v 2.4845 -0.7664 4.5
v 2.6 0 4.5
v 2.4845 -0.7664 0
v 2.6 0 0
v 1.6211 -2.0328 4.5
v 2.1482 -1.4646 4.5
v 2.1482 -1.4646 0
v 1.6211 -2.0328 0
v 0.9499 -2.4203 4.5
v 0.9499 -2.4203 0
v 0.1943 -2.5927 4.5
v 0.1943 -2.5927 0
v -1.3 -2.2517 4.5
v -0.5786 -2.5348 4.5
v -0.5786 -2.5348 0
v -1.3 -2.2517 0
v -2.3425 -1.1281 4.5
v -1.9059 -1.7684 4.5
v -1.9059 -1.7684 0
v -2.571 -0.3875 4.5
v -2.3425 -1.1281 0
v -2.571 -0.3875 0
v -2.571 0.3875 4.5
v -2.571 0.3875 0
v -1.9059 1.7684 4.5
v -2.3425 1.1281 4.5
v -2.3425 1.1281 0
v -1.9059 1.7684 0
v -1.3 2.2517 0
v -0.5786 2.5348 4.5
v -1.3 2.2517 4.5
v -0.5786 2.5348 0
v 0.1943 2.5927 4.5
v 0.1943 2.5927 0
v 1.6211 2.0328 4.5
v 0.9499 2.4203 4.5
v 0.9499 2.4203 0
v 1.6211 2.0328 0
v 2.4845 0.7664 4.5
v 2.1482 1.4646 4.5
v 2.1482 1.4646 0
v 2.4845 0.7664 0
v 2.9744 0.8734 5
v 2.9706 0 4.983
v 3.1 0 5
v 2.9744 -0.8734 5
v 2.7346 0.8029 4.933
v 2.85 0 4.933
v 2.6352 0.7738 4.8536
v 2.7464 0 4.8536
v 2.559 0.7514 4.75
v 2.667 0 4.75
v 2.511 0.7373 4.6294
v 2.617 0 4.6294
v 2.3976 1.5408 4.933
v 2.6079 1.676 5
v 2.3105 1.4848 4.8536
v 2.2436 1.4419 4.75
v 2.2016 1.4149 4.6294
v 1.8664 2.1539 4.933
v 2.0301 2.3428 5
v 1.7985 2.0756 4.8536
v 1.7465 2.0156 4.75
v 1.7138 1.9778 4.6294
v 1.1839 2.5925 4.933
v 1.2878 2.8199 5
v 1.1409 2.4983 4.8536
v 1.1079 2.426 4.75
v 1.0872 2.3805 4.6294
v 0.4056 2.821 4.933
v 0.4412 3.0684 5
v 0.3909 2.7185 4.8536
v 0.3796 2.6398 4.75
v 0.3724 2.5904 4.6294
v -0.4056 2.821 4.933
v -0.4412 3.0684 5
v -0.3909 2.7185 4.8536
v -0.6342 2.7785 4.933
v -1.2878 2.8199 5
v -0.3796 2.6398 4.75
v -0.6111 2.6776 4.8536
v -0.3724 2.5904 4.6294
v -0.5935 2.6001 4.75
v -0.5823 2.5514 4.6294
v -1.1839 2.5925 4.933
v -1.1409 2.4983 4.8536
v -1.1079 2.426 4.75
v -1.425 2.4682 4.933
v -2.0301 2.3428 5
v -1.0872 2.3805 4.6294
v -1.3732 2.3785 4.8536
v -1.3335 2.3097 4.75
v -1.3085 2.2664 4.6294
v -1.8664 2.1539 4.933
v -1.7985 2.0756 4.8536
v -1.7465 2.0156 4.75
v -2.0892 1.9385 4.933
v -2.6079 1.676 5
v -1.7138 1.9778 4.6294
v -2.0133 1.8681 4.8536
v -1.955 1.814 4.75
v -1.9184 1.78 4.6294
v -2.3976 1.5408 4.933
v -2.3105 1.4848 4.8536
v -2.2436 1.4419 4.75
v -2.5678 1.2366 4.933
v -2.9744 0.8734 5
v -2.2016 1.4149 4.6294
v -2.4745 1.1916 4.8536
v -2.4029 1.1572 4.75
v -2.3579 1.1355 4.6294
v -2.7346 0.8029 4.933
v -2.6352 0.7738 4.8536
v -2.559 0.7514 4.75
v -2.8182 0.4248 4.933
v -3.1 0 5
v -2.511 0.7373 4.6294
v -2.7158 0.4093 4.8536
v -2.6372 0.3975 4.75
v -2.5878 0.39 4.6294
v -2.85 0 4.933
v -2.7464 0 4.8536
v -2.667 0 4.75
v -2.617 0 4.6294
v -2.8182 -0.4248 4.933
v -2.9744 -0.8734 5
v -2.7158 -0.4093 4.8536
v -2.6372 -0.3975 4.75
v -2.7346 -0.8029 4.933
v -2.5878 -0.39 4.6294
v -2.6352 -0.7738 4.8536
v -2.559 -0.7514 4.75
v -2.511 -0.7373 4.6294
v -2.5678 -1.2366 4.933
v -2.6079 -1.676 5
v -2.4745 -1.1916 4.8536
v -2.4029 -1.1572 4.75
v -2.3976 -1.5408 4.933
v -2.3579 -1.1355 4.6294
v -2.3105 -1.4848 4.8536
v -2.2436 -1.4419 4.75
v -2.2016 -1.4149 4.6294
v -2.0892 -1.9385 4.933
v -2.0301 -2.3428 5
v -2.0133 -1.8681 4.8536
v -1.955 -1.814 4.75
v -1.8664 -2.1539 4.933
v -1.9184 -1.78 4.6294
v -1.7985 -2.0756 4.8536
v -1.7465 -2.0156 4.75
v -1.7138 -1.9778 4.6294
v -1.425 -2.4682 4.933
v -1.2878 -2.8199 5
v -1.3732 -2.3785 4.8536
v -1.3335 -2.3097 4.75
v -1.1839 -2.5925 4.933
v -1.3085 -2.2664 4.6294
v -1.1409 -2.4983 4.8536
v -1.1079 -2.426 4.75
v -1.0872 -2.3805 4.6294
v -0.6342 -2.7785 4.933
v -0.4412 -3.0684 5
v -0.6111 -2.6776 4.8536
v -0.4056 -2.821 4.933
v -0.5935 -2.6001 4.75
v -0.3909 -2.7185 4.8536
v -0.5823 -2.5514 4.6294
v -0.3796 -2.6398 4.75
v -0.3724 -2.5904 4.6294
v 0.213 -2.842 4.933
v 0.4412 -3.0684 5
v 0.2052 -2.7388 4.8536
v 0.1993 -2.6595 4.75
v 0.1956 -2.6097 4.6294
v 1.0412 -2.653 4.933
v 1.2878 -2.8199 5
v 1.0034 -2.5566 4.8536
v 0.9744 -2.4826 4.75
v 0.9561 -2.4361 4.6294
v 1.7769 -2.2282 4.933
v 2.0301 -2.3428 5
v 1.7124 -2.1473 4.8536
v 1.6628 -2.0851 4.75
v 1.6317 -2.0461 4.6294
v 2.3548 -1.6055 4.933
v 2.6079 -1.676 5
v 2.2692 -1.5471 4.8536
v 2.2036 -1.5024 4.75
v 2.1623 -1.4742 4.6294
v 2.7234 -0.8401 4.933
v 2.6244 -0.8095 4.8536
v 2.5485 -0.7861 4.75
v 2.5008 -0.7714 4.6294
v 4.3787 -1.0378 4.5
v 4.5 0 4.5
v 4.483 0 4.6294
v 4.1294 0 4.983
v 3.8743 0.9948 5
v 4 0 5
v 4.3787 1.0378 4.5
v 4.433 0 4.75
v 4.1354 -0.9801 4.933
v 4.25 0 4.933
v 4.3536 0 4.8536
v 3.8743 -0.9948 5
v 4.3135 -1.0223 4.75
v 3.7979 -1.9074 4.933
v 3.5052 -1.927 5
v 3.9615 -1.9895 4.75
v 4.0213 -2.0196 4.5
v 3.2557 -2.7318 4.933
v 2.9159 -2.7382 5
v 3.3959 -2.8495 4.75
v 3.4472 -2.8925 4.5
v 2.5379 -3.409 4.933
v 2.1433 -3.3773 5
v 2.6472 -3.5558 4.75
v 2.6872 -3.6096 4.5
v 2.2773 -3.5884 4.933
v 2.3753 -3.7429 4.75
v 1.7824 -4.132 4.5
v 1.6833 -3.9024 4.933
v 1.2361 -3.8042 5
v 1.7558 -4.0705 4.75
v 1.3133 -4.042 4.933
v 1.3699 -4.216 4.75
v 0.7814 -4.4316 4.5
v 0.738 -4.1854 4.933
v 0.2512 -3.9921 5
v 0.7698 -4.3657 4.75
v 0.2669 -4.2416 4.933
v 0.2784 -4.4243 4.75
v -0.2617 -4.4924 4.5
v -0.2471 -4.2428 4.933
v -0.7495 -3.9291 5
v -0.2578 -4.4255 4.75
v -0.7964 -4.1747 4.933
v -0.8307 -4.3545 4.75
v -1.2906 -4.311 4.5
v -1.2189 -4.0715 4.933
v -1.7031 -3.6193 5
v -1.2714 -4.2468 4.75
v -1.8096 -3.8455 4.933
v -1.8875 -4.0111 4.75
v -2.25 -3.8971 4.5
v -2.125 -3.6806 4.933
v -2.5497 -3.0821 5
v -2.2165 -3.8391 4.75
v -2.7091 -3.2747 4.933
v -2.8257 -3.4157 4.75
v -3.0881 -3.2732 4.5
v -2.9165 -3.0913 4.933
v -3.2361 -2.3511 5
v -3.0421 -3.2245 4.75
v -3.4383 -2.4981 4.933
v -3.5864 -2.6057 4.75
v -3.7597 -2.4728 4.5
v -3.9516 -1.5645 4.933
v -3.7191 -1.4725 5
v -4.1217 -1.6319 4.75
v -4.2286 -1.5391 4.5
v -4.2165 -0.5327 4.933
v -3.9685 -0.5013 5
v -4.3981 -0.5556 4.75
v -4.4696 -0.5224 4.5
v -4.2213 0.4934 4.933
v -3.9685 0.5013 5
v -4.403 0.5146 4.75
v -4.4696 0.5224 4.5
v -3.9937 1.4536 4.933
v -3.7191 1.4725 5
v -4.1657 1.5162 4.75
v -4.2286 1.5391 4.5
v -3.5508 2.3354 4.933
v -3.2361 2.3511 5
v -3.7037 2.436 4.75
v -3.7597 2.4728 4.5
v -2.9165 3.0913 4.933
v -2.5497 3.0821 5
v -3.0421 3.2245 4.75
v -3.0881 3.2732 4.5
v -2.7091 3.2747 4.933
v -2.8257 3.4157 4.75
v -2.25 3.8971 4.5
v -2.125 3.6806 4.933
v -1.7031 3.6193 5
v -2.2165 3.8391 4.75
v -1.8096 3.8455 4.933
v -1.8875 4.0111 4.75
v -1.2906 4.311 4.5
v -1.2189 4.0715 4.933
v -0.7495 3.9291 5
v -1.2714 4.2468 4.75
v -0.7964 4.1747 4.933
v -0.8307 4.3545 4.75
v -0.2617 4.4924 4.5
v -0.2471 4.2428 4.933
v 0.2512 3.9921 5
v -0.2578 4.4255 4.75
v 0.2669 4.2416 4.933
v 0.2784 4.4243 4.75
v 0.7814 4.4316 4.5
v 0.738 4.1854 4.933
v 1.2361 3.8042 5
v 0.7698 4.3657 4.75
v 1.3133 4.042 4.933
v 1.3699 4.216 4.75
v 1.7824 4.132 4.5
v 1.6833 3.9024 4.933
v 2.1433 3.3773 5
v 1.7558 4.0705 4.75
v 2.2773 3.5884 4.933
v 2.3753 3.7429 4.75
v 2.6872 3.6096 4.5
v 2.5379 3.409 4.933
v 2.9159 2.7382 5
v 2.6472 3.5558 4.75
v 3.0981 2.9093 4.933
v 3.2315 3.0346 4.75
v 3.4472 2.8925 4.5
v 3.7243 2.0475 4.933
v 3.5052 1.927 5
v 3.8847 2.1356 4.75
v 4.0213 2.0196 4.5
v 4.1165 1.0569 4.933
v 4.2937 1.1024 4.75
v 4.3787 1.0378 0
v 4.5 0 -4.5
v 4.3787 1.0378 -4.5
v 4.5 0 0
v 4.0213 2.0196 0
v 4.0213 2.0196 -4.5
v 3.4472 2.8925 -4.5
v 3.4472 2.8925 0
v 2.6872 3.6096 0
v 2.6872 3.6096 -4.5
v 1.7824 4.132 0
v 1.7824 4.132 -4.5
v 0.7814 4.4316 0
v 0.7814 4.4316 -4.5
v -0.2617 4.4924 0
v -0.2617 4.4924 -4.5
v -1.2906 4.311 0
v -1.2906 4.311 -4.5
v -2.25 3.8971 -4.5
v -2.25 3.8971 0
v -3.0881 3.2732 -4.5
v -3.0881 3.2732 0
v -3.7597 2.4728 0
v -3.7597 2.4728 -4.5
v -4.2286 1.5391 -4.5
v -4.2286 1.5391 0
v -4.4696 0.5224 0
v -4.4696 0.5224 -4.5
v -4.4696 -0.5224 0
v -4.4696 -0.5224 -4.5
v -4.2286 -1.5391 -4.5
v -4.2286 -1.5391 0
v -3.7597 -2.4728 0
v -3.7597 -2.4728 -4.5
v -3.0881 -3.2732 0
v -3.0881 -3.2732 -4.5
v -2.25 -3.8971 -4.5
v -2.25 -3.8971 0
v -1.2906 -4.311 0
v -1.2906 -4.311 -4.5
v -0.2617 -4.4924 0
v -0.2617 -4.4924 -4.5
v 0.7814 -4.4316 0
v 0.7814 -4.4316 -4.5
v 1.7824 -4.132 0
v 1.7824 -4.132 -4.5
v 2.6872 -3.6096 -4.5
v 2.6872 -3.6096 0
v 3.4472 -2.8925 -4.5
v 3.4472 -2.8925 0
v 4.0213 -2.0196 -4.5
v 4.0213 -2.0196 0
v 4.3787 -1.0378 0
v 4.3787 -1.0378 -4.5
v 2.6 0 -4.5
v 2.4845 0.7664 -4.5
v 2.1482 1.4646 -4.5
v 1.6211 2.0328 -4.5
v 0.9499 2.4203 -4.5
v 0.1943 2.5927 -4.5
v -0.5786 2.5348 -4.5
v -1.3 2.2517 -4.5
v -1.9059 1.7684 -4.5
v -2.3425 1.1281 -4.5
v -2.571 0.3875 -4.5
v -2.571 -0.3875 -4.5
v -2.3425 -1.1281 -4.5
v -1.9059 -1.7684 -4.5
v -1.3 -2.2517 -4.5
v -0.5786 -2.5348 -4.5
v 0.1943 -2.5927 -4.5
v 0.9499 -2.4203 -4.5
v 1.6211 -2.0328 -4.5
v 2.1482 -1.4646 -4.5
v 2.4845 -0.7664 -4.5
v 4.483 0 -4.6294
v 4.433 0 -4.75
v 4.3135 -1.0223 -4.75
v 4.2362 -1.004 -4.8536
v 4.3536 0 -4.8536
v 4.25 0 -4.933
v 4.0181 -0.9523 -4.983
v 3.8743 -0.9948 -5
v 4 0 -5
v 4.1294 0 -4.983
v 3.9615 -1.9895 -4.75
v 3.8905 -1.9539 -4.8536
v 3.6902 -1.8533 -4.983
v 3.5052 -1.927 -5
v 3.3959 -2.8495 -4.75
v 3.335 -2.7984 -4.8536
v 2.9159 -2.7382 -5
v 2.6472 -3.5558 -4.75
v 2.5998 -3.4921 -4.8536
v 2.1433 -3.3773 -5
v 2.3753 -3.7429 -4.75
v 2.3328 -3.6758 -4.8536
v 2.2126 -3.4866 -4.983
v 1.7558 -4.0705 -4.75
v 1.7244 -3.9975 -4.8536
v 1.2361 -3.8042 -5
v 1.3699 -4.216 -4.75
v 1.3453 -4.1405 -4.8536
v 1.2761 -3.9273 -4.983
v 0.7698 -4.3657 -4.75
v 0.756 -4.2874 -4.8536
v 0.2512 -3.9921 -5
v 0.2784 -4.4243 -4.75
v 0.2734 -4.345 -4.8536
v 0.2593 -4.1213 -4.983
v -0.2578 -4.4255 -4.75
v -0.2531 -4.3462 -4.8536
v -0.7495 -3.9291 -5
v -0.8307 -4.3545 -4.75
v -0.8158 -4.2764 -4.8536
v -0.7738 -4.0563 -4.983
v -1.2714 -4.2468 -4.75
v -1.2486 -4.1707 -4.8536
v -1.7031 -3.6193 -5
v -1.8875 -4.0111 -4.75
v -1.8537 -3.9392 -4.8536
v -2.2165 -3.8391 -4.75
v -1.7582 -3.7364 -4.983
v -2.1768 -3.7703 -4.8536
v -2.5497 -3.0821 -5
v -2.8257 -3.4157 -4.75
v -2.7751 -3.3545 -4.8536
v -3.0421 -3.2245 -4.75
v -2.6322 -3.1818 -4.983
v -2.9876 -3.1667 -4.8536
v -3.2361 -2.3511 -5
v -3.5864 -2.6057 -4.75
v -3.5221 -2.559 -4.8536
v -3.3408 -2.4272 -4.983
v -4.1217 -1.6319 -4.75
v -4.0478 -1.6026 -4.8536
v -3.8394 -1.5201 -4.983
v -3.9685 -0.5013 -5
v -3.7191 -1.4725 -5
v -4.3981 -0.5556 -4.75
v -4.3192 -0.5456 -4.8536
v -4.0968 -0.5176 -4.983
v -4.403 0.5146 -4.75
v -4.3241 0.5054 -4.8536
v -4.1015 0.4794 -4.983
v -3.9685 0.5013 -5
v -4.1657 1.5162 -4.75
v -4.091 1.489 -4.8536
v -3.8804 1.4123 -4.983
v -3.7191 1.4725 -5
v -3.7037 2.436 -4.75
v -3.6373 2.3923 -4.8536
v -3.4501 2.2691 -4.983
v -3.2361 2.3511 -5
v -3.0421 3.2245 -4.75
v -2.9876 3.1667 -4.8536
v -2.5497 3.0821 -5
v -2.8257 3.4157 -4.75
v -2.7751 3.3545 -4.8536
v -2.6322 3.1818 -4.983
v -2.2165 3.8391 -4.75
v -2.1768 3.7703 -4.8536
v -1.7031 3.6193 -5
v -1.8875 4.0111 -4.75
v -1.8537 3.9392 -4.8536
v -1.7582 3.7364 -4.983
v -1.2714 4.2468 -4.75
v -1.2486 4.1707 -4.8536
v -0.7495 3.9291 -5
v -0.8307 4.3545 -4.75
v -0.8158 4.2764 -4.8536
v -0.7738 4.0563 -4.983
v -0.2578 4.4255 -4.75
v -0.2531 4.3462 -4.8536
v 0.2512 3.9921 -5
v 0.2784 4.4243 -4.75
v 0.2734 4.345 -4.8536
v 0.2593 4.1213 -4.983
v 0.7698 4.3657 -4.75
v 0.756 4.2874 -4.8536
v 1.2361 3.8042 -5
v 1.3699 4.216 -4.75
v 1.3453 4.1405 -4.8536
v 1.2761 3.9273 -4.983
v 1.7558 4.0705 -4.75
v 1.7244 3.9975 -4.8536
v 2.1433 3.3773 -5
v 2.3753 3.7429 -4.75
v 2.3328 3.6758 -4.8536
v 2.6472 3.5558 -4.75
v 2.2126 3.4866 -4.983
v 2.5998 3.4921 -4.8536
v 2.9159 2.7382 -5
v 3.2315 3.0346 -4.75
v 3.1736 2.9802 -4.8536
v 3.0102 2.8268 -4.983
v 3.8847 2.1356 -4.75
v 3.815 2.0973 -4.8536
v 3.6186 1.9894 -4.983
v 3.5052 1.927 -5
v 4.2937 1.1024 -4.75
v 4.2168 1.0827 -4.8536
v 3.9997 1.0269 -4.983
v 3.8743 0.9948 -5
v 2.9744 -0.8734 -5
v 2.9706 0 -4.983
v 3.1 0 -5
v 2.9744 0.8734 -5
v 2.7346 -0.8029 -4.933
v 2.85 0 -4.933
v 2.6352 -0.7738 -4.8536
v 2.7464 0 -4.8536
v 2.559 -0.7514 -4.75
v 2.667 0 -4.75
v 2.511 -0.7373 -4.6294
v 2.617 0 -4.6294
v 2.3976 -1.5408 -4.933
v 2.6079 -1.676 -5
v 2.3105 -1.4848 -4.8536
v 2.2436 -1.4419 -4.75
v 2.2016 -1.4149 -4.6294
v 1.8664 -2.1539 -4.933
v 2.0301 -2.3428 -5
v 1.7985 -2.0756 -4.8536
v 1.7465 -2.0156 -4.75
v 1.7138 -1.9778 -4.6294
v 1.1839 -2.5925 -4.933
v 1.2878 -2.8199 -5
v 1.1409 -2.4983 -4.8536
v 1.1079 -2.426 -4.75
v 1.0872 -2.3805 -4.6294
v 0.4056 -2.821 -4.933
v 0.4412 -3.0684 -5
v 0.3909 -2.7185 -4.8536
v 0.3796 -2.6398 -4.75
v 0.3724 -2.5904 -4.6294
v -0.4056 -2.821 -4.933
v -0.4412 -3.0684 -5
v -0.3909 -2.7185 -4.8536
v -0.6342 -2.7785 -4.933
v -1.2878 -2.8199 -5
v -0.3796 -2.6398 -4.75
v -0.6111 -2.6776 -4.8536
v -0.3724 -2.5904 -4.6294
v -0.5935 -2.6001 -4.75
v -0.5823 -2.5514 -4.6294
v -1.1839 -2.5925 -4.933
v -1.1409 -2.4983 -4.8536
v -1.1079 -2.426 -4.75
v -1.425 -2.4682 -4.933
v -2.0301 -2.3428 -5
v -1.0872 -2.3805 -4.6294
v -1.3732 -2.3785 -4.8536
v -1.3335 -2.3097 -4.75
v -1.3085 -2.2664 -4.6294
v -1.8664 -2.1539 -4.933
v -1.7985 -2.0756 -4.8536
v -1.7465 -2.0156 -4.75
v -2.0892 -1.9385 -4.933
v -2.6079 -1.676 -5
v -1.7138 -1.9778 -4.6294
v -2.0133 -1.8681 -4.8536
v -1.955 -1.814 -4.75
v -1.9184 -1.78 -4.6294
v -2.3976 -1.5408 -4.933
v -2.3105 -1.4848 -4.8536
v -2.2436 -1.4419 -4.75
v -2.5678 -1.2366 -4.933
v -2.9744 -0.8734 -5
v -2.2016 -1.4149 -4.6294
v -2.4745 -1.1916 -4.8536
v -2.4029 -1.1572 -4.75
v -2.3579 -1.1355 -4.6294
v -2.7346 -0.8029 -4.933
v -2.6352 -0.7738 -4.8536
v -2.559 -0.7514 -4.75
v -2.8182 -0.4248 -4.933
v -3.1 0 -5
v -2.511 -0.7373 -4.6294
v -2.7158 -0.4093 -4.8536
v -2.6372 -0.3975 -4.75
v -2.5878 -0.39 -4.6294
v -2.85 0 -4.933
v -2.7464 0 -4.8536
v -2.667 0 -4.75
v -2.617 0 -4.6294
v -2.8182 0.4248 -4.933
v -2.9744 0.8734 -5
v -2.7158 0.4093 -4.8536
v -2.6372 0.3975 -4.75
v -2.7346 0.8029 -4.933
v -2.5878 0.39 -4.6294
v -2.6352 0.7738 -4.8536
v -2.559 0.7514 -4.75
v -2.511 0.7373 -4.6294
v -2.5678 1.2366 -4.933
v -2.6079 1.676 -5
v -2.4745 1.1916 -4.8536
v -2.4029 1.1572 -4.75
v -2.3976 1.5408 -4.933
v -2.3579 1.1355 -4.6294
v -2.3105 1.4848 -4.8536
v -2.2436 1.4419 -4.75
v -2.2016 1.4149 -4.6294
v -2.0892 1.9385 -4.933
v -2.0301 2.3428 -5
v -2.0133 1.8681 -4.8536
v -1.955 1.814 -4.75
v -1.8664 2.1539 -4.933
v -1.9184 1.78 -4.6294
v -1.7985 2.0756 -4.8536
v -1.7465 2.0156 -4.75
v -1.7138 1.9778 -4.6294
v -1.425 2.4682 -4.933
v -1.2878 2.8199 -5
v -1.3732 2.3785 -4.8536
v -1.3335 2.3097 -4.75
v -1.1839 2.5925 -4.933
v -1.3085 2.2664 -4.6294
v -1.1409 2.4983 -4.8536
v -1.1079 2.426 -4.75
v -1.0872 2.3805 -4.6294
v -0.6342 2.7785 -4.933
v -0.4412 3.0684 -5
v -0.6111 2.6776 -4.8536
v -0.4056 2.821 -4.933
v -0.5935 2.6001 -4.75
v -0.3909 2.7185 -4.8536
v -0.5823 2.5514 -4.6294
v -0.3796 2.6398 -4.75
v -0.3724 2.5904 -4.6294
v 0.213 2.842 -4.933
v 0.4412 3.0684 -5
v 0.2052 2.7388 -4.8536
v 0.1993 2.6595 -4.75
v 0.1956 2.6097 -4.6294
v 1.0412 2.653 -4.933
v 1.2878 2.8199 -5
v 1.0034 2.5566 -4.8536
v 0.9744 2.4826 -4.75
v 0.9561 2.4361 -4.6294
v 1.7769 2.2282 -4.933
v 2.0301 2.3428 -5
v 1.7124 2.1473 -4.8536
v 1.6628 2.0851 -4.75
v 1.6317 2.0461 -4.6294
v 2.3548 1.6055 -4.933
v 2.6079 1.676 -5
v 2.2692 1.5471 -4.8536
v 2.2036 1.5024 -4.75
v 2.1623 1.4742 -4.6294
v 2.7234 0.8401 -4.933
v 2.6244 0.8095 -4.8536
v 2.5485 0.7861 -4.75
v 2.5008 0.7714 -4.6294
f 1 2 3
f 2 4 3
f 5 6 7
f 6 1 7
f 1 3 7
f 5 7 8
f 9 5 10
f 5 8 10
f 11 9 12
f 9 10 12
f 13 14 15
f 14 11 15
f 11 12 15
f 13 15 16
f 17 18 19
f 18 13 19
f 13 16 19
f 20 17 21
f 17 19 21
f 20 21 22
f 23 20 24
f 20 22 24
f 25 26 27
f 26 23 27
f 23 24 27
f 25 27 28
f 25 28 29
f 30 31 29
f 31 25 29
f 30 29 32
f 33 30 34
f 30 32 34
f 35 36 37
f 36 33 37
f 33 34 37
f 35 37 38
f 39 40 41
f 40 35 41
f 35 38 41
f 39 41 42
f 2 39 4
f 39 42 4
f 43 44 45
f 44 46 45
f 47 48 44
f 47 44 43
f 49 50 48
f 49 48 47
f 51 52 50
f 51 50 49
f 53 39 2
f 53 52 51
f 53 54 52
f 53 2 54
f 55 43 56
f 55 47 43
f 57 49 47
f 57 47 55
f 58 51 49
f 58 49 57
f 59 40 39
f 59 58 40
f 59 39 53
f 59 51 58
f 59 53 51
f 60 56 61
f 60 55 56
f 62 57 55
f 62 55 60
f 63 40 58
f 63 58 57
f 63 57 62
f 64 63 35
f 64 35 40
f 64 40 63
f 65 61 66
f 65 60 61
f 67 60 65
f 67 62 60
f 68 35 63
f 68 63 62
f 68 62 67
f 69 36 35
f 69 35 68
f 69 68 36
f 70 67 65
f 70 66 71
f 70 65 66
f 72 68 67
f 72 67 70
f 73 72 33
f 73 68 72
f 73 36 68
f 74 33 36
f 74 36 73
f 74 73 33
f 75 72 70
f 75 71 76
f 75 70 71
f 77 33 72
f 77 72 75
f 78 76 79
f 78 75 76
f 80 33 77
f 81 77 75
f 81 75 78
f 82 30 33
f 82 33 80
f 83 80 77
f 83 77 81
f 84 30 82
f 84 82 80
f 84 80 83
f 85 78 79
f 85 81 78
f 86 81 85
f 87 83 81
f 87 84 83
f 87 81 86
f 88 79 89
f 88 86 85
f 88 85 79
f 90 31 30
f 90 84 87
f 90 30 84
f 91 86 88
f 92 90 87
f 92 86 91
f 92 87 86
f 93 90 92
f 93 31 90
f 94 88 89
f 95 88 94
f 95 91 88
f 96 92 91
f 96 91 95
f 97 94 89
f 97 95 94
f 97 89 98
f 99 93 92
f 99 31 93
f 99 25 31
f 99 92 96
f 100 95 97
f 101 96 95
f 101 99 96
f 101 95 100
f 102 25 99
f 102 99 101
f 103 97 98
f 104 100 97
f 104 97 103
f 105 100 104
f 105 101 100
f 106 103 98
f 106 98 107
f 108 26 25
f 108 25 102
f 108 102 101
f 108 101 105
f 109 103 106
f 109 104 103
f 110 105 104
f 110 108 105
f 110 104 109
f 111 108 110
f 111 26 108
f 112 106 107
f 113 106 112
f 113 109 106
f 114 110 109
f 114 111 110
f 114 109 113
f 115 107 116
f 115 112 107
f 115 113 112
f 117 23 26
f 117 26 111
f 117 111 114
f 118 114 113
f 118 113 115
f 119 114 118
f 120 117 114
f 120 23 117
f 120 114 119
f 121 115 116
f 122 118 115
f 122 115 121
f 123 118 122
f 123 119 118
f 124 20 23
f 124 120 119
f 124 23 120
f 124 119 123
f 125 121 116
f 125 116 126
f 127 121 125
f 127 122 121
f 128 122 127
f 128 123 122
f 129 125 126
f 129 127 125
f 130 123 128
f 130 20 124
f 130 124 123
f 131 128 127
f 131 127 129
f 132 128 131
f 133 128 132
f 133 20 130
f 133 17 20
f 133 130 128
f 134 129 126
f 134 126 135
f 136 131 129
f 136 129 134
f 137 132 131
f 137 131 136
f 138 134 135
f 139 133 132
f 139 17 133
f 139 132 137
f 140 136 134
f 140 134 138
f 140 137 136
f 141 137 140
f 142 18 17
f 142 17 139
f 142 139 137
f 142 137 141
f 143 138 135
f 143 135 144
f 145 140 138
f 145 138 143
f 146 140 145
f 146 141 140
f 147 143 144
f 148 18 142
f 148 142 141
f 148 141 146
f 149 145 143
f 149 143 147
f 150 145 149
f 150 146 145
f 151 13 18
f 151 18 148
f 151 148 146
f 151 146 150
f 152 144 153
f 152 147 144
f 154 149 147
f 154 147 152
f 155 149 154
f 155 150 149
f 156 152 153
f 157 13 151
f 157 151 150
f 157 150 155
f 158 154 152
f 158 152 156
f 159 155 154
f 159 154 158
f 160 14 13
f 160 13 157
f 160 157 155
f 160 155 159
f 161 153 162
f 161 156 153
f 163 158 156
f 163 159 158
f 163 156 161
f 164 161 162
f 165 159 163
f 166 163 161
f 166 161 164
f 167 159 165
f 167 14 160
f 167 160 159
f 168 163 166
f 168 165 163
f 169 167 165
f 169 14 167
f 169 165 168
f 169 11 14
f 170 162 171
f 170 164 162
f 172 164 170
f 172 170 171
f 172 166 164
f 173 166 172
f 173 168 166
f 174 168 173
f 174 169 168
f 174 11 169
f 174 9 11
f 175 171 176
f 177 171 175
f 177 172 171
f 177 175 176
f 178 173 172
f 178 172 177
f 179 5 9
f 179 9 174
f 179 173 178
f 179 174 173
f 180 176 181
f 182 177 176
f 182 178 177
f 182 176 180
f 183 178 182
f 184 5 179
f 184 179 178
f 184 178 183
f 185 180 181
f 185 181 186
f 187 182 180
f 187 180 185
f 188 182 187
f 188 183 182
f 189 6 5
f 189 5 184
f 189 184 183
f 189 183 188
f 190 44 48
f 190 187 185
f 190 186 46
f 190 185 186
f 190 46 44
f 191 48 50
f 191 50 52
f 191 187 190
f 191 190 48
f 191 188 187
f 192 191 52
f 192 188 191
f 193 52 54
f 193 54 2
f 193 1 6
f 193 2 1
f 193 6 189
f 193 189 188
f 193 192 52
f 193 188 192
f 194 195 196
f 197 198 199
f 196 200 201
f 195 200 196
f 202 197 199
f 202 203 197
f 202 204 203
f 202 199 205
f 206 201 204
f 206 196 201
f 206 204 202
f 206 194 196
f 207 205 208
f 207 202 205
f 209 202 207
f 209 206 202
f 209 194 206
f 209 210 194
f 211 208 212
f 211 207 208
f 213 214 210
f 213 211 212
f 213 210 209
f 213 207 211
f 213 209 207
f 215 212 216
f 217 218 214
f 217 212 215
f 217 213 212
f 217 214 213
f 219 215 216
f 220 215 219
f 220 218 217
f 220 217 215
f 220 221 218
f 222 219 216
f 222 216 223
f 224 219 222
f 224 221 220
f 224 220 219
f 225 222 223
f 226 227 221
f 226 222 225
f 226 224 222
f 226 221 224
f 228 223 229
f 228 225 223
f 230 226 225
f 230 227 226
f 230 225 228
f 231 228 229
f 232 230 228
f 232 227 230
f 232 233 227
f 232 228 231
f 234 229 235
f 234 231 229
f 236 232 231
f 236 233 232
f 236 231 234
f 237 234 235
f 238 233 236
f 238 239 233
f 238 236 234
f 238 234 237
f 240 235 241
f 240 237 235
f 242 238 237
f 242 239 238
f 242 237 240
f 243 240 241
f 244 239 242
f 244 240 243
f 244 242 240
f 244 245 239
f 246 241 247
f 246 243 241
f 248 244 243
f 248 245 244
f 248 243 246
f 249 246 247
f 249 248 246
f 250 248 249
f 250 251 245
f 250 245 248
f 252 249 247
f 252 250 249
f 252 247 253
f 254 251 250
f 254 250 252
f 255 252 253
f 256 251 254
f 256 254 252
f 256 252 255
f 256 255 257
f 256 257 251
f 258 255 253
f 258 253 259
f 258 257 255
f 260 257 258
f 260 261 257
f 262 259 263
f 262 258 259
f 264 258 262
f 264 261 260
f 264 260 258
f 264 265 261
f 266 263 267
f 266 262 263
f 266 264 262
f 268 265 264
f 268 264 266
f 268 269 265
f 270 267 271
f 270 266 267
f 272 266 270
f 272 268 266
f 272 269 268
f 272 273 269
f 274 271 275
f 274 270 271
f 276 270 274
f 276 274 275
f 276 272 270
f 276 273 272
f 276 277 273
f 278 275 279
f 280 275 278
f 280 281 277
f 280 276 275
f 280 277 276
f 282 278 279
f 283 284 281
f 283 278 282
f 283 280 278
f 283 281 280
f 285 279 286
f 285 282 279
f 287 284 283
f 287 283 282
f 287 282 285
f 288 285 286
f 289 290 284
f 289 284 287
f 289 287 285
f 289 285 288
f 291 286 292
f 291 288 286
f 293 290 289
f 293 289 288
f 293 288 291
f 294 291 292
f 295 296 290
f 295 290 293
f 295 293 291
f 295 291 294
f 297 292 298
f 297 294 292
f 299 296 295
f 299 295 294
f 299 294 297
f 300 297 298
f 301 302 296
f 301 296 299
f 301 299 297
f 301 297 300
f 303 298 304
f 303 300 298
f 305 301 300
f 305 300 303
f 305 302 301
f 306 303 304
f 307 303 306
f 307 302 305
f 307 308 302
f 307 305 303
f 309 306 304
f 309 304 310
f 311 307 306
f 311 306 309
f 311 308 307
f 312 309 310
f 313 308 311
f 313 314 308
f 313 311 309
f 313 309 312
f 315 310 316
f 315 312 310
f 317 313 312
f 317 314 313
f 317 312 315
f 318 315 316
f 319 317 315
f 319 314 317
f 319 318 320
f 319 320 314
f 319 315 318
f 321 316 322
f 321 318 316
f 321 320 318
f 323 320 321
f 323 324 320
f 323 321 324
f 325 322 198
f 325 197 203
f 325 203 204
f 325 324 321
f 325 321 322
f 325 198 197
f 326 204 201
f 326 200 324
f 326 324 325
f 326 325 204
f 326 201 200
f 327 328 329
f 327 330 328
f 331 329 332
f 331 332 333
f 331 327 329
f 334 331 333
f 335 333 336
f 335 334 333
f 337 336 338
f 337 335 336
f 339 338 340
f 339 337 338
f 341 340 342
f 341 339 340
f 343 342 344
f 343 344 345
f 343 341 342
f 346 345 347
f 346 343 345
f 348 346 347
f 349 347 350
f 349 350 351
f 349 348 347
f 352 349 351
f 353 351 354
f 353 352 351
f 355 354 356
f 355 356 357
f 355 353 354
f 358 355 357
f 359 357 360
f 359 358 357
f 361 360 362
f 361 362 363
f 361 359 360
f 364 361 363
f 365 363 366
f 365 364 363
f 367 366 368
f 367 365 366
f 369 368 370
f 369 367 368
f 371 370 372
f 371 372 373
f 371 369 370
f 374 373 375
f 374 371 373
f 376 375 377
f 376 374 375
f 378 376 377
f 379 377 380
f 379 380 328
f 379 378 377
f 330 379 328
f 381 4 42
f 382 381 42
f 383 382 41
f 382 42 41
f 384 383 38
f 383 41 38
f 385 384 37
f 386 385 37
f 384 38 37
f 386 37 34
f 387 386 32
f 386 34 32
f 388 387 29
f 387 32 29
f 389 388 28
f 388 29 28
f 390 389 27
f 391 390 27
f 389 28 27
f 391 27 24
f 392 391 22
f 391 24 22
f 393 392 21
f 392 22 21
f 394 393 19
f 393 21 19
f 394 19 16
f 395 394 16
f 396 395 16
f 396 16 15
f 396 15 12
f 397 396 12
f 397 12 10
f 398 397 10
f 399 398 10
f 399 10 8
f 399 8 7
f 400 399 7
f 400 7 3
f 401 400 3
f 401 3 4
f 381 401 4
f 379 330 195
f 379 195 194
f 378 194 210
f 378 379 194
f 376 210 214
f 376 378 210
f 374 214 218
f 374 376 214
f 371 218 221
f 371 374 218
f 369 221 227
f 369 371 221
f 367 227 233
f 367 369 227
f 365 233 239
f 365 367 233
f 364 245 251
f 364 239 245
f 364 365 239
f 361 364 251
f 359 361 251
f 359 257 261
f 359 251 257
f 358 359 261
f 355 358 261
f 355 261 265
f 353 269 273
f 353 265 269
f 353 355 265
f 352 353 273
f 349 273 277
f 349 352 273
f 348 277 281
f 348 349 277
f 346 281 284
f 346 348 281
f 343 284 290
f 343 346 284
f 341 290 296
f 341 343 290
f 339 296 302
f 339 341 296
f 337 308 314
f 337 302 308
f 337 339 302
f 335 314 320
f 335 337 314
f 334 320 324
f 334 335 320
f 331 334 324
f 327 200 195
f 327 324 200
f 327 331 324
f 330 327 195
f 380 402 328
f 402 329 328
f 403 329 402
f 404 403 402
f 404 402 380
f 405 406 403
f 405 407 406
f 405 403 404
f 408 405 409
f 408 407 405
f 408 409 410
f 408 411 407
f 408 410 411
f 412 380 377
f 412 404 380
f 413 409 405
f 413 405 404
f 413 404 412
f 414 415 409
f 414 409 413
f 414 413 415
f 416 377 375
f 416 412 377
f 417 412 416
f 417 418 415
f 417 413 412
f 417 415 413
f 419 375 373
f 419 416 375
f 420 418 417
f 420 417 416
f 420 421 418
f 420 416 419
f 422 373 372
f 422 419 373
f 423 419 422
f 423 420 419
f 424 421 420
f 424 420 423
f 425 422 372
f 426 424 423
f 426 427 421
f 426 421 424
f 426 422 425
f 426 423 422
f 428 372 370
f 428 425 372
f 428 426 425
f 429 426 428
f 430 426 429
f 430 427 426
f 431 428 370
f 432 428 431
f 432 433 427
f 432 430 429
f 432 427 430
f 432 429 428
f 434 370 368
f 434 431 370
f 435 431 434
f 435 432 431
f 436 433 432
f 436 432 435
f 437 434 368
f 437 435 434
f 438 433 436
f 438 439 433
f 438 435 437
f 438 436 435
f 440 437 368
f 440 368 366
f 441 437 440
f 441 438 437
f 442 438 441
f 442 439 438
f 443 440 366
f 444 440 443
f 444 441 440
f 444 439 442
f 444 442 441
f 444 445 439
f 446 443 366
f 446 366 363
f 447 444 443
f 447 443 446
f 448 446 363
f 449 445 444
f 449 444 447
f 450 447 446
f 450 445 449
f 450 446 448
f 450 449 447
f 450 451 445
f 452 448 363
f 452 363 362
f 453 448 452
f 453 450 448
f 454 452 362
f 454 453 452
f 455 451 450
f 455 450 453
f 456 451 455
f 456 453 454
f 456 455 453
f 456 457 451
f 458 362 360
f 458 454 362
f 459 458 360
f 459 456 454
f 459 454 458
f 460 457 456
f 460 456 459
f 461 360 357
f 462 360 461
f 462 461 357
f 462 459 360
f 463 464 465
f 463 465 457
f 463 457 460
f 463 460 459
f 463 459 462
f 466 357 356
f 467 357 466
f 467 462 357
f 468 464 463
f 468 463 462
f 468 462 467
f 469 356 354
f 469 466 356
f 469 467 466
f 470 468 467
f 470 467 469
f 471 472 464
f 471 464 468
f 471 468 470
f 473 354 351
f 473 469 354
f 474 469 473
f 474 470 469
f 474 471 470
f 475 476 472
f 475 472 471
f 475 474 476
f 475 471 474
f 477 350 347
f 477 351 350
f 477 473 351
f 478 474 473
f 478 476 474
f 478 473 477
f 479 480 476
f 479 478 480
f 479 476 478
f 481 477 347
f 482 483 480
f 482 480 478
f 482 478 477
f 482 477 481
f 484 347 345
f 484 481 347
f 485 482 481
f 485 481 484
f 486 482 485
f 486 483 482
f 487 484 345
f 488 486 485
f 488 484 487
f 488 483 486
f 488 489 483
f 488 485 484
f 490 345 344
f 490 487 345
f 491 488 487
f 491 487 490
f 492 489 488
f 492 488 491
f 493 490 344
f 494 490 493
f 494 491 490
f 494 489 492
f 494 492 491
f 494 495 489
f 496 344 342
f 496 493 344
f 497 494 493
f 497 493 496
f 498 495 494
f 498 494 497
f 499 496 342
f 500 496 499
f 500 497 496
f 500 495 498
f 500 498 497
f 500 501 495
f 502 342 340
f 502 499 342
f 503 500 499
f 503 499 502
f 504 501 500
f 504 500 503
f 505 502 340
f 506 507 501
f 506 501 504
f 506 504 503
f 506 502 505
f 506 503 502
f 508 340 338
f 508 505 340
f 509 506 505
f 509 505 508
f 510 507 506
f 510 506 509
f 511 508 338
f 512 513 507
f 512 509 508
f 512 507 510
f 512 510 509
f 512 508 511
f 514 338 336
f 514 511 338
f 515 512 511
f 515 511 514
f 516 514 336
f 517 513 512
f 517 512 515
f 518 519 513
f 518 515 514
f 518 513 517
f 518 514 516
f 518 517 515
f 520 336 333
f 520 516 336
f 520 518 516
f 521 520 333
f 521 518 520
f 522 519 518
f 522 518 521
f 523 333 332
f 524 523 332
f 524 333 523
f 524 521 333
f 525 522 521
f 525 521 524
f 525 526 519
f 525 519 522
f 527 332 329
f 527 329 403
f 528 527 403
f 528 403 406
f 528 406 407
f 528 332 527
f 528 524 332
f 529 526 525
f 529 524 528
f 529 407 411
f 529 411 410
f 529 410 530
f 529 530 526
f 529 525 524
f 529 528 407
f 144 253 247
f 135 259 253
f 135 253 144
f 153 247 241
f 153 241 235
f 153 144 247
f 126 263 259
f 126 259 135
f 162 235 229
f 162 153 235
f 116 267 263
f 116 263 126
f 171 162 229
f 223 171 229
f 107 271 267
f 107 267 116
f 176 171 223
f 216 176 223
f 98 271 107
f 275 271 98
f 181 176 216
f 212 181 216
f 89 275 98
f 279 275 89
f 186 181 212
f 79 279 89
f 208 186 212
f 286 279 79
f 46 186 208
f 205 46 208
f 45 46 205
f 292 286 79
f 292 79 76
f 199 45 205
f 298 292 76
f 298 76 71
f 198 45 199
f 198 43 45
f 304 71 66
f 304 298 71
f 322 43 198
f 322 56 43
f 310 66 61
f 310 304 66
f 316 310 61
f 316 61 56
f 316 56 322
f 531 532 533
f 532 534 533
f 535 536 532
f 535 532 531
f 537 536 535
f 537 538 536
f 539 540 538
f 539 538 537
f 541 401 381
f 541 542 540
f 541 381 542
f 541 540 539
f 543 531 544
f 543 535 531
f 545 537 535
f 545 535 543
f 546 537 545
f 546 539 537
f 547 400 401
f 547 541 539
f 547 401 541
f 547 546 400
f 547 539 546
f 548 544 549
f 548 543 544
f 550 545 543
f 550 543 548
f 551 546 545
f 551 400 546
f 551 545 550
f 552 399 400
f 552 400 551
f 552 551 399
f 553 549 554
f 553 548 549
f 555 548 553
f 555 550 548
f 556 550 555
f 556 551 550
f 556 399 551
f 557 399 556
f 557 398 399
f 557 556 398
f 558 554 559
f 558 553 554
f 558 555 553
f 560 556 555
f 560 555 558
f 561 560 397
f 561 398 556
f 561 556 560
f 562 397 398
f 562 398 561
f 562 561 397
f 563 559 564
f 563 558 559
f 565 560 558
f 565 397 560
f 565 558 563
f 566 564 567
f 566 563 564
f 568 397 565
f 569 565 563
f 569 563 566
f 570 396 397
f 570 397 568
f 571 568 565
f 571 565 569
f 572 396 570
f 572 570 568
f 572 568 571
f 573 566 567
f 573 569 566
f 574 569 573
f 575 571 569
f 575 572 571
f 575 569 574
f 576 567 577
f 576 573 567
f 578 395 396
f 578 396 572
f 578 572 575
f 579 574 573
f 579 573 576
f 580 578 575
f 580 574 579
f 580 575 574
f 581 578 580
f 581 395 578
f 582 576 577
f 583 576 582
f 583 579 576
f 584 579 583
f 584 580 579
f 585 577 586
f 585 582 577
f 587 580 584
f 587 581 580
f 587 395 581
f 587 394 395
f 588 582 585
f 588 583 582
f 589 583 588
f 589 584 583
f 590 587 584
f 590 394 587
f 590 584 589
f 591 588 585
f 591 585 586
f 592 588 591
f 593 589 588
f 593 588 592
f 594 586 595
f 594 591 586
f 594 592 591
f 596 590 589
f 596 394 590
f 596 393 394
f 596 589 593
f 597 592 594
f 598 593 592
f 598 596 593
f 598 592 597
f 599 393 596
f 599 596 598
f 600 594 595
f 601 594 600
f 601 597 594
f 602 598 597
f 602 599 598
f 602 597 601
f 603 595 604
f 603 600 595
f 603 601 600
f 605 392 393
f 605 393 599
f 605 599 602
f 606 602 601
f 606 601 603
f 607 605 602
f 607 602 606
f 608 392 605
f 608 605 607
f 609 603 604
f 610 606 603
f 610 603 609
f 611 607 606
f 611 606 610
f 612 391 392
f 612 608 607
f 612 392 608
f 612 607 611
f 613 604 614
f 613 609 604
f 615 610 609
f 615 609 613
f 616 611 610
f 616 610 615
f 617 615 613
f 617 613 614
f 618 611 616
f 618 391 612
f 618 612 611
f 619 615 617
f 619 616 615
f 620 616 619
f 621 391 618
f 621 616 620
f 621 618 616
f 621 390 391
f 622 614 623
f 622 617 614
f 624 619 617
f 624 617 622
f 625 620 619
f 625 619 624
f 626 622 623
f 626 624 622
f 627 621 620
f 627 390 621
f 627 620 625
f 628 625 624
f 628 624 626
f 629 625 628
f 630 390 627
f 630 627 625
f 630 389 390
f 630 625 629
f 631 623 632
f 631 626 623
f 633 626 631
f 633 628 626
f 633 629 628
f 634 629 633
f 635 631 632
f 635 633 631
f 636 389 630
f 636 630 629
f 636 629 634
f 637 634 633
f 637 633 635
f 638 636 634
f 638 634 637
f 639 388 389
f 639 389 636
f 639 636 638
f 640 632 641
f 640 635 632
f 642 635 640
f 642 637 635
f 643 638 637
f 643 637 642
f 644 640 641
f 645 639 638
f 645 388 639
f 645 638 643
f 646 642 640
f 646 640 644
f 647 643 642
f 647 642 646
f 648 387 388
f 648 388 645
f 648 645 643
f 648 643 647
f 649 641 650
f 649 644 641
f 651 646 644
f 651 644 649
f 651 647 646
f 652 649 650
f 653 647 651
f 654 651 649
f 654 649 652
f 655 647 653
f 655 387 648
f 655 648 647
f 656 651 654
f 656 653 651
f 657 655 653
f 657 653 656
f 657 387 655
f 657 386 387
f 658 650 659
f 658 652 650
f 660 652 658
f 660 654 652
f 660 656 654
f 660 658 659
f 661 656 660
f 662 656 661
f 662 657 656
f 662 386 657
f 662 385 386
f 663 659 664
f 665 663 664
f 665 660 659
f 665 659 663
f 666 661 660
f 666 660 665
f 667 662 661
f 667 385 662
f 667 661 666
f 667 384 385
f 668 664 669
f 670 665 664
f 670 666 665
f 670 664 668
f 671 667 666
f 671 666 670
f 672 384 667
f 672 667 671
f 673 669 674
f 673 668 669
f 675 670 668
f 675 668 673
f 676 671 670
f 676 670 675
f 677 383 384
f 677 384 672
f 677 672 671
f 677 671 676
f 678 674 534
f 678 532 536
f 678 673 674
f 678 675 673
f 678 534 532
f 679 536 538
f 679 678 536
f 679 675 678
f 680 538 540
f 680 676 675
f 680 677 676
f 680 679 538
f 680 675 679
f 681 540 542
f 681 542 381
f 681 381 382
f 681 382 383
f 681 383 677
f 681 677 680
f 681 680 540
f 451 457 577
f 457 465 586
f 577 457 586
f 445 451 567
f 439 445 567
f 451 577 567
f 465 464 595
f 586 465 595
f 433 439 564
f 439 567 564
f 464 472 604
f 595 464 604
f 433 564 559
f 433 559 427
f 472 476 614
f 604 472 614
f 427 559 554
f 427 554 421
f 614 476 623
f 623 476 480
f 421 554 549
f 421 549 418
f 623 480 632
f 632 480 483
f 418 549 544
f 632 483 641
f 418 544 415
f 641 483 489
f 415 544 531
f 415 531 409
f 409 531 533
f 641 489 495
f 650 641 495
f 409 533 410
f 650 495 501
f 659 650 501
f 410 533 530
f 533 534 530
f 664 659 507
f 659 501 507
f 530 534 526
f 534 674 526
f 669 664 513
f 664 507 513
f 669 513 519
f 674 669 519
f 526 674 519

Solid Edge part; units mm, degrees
sketch "Sketch1" plane through (0, 0, 0) normal (0, 0, 1) x (1, 0, 0)
  circle A0 centre (0, 0) radius 4.5
  circle A1 centre (0, 0) radius 2.6
  dimension "D1" = 9
  dimension "D2" = 5.2
extrude "Protrusion1" add sketch "Sketch1" along normal mid plane 10
fillet "Round_1" radius 0.5 2 edges at (-2.6, 0, -5) (-2.6, 0, 5)
fillet "Round_2" radius 0.5 2 edges at (-4.5, 0, -5) (-4.5, 0, 5)
properties material "Acrylic, high impact grade"
